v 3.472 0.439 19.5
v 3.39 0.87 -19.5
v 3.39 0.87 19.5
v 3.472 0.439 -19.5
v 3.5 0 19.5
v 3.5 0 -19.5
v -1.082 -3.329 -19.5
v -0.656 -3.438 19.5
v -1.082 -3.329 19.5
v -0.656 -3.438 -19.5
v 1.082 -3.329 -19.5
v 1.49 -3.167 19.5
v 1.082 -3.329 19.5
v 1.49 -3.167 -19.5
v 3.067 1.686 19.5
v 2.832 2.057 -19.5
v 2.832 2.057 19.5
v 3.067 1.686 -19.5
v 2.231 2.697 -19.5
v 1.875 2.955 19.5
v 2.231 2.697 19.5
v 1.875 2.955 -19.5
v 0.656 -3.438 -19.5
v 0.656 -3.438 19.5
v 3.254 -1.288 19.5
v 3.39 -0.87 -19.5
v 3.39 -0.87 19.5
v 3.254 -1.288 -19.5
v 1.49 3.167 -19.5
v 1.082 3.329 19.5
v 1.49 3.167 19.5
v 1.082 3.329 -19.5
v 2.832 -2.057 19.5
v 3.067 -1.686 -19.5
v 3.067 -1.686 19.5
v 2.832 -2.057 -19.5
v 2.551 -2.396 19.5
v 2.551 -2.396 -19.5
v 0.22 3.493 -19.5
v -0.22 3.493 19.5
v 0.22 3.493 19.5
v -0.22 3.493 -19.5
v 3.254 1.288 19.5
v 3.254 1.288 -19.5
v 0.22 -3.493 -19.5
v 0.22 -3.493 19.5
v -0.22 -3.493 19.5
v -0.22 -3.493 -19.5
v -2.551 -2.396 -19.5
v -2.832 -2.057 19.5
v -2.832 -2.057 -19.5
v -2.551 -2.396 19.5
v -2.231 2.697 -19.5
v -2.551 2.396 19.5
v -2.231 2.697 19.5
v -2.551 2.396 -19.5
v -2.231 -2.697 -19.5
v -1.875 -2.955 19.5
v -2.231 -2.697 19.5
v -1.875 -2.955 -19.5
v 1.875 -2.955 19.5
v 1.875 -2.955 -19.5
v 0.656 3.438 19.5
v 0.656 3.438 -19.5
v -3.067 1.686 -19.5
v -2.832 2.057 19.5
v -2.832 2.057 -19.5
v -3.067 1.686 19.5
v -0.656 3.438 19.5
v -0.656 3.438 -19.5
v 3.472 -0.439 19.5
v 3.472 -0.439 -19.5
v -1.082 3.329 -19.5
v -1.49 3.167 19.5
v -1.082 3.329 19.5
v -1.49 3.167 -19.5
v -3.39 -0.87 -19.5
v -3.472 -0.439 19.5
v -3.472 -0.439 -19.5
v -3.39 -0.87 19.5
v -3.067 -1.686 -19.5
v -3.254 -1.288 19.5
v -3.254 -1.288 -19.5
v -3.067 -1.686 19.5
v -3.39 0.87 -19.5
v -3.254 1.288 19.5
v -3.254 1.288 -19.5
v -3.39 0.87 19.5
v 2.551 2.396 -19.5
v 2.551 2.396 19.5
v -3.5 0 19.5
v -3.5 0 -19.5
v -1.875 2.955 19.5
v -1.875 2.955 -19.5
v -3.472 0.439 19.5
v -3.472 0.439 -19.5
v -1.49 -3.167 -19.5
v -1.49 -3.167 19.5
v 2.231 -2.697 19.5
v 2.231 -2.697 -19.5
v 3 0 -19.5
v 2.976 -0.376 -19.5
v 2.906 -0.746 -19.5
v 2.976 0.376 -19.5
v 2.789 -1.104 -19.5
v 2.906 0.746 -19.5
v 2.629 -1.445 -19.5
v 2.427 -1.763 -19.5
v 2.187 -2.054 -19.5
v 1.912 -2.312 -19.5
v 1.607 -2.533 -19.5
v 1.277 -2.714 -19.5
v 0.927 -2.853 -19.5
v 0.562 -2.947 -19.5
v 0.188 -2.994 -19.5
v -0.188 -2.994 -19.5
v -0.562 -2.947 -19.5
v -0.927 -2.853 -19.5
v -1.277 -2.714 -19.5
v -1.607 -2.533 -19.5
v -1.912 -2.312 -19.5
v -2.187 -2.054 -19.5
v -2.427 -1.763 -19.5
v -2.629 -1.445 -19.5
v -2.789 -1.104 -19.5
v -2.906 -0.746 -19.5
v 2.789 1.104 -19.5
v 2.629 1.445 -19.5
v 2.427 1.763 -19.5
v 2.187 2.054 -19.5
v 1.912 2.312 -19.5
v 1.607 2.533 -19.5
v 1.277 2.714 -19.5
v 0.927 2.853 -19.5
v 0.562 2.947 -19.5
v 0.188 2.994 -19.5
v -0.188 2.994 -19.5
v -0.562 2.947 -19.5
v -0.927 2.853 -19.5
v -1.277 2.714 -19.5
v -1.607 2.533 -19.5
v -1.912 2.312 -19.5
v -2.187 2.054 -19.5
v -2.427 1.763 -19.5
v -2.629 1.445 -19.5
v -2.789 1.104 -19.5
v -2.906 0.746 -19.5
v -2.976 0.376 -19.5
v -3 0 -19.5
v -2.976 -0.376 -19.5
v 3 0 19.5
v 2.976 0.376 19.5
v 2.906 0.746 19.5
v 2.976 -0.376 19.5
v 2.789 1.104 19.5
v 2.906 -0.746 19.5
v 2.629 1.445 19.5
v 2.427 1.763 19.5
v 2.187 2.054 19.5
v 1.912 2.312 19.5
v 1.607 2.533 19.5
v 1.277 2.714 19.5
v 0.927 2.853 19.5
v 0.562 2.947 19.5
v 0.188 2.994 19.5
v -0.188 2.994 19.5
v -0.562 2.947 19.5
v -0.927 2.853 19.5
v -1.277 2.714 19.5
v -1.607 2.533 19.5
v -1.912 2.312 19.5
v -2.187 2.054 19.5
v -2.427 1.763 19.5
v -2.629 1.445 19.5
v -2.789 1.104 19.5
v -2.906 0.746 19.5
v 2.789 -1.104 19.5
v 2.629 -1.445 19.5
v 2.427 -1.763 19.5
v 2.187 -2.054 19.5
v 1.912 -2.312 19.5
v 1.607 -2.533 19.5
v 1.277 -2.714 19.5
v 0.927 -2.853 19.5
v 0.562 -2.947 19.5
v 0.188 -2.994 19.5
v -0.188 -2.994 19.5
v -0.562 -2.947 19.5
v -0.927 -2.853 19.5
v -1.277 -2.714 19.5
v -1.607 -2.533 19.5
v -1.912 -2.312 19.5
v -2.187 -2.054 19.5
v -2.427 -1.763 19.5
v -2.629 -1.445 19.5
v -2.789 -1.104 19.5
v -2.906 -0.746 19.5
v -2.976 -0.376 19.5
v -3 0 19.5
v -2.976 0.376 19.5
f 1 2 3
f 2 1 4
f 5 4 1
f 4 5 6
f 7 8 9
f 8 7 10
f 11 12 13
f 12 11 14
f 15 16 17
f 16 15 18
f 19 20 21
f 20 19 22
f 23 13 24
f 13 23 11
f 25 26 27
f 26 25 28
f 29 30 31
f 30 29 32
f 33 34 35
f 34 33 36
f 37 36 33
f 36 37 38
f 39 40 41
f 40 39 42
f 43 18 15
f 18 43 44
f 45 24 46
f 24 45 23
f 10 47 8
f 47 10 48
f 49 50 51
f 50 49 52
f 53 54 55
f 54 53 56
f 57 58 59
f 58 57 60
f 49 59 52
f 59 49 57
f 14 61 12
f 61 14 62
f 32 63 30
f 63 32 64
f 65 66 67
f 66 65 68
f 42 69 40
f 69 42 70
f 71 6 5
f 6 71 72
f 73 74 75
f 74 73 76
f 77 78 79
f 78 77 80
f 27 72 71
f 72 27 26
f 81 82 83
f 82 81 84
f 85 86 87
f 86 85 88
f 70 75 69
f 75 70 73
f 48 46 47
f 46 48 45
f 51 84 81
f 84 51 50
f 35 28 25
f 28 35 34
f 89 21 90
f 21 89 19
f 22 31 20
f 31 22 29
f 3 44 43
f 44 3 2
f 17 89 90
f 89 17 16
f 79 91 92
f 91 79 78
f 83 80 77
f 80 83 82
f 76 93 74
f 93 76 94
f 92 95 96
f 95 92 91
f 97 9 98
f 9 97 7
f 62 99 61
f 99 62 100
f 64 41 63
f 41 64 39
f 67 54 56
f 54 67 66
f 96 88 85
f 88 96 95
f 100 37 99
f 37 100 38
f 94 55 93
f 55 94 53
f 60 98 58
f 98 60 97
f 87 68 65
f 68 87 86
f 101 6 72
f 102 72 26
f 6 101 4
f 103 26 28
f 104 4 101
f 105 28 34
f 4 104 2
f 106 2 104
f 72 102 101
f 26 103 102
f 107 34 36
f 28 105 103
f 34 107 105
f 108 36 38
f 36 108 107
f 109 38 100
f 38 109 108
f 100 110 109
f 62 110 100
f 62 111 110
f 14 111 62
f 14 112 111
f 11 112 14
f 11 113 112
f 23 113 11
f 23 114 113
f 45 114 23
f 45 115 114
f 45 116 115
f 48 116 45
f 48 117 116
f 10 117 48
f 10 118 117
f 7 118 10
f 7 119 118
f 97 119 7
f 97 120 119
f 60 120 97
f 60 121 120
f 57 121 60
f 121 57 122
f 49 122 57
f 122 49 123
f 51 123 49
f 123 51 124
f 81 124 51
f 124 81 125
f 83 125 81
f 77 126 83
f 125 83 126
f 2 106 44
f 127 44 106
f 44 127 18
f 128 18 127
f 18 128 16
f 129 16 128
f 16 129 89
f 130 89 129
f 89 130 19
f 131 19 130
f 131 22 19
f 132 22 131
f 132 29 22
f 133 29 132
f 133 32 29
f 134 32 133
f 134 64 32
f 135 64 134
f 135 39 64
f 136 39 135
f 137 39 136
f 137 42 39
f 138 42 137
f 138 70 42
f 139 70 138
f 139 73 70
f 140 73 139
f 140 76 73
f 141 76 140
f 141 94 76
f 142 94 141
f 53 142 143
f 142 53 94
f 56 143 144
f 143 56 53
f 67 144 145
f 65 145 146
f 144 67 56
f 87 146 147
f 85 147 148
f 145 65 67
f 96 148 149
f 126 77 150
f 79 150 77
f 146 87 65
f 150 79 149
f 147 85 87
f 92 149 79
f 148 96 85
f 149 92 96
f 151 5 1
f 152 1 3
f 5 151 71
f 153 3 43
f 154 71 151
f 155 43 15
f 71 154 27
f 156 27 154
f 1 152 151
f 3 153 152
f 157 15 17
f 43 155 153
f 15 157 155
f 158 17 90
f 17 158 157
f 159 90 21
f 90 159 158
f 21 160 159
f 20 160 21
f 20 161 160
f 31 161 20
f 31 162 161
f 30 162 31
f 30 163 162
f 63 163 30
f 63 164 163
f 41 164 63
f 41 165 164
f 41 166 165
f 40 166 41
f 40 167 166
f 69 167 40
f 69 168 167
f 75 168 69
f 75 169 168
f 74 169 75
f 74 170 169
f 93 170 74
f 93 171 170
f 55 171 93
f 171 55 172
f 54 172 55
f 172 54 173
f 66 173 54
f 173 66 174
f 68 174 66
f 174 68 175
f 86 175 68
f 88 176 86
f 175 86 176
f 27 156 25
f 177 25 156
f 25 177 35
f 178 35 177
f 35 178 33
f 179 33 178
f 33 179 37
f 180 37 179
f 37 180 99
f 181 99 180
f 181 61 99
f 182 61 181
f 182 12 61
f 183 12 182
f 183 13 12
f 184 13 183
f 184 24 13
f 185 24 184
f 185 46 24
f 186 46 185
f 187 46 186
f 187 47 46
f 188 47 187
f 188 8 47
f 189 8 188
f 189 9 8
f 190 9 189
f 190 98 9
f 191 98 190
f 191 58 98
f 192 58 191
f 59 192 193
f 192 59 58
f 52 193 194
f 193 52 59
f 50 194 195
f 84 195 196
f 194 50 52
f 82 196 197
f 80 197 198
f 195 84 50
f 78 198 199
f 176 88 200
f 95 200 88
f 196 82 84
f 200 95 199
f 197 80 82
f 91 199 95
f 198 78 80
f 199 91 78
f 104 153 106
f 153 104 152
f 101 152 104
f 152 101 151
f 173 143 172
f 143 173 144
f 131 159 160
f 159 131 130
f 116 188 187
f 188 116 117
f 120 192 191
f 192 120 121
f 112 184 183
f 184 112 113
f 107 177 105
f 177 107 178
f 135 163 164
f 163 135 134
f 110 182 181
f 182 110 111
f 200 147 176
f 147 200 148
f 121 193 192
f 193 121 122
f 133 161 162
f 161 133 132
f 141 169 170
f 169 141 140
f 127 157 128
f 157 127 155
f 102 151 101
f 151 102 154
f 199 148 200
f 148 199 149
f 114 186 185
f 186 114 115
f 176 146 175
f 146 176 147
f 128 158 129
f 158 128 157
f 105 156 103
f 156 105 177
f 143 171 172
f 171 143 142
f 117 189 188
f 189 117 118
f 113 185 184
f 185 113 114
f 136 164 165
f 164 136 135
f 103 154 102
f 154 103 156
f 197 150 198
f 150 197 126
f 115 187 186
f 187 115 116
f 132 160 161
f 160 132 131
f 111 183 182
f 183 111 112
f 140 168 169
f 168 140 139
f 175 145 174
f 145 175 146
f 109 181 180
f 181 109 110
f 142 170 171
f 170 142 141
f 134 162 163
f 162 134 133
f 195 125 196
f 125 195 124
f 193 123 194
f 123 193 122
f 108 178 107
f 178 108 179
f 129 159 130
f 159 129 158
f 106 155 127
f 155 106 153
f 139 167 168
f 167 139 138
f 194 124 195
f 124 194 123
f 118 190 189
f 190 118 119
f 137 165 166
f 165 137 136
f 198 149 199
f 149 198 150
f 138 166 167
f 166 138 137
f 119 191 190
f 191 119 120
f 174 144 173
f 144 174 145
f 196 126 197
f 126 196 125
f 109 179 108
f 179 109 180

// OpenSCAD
$fn = 50;


difference() {
	union() {
		translate(v = [0, 0, -19.5000000000]) {
			cylinder(h = 39, r = 3.5000000000);
		}
	}
	union() {
		translate(v = [0, 0, -100.0000000000]) {
			cylinder(h = 200, r = 3.0000000000);
		}
	}
}
